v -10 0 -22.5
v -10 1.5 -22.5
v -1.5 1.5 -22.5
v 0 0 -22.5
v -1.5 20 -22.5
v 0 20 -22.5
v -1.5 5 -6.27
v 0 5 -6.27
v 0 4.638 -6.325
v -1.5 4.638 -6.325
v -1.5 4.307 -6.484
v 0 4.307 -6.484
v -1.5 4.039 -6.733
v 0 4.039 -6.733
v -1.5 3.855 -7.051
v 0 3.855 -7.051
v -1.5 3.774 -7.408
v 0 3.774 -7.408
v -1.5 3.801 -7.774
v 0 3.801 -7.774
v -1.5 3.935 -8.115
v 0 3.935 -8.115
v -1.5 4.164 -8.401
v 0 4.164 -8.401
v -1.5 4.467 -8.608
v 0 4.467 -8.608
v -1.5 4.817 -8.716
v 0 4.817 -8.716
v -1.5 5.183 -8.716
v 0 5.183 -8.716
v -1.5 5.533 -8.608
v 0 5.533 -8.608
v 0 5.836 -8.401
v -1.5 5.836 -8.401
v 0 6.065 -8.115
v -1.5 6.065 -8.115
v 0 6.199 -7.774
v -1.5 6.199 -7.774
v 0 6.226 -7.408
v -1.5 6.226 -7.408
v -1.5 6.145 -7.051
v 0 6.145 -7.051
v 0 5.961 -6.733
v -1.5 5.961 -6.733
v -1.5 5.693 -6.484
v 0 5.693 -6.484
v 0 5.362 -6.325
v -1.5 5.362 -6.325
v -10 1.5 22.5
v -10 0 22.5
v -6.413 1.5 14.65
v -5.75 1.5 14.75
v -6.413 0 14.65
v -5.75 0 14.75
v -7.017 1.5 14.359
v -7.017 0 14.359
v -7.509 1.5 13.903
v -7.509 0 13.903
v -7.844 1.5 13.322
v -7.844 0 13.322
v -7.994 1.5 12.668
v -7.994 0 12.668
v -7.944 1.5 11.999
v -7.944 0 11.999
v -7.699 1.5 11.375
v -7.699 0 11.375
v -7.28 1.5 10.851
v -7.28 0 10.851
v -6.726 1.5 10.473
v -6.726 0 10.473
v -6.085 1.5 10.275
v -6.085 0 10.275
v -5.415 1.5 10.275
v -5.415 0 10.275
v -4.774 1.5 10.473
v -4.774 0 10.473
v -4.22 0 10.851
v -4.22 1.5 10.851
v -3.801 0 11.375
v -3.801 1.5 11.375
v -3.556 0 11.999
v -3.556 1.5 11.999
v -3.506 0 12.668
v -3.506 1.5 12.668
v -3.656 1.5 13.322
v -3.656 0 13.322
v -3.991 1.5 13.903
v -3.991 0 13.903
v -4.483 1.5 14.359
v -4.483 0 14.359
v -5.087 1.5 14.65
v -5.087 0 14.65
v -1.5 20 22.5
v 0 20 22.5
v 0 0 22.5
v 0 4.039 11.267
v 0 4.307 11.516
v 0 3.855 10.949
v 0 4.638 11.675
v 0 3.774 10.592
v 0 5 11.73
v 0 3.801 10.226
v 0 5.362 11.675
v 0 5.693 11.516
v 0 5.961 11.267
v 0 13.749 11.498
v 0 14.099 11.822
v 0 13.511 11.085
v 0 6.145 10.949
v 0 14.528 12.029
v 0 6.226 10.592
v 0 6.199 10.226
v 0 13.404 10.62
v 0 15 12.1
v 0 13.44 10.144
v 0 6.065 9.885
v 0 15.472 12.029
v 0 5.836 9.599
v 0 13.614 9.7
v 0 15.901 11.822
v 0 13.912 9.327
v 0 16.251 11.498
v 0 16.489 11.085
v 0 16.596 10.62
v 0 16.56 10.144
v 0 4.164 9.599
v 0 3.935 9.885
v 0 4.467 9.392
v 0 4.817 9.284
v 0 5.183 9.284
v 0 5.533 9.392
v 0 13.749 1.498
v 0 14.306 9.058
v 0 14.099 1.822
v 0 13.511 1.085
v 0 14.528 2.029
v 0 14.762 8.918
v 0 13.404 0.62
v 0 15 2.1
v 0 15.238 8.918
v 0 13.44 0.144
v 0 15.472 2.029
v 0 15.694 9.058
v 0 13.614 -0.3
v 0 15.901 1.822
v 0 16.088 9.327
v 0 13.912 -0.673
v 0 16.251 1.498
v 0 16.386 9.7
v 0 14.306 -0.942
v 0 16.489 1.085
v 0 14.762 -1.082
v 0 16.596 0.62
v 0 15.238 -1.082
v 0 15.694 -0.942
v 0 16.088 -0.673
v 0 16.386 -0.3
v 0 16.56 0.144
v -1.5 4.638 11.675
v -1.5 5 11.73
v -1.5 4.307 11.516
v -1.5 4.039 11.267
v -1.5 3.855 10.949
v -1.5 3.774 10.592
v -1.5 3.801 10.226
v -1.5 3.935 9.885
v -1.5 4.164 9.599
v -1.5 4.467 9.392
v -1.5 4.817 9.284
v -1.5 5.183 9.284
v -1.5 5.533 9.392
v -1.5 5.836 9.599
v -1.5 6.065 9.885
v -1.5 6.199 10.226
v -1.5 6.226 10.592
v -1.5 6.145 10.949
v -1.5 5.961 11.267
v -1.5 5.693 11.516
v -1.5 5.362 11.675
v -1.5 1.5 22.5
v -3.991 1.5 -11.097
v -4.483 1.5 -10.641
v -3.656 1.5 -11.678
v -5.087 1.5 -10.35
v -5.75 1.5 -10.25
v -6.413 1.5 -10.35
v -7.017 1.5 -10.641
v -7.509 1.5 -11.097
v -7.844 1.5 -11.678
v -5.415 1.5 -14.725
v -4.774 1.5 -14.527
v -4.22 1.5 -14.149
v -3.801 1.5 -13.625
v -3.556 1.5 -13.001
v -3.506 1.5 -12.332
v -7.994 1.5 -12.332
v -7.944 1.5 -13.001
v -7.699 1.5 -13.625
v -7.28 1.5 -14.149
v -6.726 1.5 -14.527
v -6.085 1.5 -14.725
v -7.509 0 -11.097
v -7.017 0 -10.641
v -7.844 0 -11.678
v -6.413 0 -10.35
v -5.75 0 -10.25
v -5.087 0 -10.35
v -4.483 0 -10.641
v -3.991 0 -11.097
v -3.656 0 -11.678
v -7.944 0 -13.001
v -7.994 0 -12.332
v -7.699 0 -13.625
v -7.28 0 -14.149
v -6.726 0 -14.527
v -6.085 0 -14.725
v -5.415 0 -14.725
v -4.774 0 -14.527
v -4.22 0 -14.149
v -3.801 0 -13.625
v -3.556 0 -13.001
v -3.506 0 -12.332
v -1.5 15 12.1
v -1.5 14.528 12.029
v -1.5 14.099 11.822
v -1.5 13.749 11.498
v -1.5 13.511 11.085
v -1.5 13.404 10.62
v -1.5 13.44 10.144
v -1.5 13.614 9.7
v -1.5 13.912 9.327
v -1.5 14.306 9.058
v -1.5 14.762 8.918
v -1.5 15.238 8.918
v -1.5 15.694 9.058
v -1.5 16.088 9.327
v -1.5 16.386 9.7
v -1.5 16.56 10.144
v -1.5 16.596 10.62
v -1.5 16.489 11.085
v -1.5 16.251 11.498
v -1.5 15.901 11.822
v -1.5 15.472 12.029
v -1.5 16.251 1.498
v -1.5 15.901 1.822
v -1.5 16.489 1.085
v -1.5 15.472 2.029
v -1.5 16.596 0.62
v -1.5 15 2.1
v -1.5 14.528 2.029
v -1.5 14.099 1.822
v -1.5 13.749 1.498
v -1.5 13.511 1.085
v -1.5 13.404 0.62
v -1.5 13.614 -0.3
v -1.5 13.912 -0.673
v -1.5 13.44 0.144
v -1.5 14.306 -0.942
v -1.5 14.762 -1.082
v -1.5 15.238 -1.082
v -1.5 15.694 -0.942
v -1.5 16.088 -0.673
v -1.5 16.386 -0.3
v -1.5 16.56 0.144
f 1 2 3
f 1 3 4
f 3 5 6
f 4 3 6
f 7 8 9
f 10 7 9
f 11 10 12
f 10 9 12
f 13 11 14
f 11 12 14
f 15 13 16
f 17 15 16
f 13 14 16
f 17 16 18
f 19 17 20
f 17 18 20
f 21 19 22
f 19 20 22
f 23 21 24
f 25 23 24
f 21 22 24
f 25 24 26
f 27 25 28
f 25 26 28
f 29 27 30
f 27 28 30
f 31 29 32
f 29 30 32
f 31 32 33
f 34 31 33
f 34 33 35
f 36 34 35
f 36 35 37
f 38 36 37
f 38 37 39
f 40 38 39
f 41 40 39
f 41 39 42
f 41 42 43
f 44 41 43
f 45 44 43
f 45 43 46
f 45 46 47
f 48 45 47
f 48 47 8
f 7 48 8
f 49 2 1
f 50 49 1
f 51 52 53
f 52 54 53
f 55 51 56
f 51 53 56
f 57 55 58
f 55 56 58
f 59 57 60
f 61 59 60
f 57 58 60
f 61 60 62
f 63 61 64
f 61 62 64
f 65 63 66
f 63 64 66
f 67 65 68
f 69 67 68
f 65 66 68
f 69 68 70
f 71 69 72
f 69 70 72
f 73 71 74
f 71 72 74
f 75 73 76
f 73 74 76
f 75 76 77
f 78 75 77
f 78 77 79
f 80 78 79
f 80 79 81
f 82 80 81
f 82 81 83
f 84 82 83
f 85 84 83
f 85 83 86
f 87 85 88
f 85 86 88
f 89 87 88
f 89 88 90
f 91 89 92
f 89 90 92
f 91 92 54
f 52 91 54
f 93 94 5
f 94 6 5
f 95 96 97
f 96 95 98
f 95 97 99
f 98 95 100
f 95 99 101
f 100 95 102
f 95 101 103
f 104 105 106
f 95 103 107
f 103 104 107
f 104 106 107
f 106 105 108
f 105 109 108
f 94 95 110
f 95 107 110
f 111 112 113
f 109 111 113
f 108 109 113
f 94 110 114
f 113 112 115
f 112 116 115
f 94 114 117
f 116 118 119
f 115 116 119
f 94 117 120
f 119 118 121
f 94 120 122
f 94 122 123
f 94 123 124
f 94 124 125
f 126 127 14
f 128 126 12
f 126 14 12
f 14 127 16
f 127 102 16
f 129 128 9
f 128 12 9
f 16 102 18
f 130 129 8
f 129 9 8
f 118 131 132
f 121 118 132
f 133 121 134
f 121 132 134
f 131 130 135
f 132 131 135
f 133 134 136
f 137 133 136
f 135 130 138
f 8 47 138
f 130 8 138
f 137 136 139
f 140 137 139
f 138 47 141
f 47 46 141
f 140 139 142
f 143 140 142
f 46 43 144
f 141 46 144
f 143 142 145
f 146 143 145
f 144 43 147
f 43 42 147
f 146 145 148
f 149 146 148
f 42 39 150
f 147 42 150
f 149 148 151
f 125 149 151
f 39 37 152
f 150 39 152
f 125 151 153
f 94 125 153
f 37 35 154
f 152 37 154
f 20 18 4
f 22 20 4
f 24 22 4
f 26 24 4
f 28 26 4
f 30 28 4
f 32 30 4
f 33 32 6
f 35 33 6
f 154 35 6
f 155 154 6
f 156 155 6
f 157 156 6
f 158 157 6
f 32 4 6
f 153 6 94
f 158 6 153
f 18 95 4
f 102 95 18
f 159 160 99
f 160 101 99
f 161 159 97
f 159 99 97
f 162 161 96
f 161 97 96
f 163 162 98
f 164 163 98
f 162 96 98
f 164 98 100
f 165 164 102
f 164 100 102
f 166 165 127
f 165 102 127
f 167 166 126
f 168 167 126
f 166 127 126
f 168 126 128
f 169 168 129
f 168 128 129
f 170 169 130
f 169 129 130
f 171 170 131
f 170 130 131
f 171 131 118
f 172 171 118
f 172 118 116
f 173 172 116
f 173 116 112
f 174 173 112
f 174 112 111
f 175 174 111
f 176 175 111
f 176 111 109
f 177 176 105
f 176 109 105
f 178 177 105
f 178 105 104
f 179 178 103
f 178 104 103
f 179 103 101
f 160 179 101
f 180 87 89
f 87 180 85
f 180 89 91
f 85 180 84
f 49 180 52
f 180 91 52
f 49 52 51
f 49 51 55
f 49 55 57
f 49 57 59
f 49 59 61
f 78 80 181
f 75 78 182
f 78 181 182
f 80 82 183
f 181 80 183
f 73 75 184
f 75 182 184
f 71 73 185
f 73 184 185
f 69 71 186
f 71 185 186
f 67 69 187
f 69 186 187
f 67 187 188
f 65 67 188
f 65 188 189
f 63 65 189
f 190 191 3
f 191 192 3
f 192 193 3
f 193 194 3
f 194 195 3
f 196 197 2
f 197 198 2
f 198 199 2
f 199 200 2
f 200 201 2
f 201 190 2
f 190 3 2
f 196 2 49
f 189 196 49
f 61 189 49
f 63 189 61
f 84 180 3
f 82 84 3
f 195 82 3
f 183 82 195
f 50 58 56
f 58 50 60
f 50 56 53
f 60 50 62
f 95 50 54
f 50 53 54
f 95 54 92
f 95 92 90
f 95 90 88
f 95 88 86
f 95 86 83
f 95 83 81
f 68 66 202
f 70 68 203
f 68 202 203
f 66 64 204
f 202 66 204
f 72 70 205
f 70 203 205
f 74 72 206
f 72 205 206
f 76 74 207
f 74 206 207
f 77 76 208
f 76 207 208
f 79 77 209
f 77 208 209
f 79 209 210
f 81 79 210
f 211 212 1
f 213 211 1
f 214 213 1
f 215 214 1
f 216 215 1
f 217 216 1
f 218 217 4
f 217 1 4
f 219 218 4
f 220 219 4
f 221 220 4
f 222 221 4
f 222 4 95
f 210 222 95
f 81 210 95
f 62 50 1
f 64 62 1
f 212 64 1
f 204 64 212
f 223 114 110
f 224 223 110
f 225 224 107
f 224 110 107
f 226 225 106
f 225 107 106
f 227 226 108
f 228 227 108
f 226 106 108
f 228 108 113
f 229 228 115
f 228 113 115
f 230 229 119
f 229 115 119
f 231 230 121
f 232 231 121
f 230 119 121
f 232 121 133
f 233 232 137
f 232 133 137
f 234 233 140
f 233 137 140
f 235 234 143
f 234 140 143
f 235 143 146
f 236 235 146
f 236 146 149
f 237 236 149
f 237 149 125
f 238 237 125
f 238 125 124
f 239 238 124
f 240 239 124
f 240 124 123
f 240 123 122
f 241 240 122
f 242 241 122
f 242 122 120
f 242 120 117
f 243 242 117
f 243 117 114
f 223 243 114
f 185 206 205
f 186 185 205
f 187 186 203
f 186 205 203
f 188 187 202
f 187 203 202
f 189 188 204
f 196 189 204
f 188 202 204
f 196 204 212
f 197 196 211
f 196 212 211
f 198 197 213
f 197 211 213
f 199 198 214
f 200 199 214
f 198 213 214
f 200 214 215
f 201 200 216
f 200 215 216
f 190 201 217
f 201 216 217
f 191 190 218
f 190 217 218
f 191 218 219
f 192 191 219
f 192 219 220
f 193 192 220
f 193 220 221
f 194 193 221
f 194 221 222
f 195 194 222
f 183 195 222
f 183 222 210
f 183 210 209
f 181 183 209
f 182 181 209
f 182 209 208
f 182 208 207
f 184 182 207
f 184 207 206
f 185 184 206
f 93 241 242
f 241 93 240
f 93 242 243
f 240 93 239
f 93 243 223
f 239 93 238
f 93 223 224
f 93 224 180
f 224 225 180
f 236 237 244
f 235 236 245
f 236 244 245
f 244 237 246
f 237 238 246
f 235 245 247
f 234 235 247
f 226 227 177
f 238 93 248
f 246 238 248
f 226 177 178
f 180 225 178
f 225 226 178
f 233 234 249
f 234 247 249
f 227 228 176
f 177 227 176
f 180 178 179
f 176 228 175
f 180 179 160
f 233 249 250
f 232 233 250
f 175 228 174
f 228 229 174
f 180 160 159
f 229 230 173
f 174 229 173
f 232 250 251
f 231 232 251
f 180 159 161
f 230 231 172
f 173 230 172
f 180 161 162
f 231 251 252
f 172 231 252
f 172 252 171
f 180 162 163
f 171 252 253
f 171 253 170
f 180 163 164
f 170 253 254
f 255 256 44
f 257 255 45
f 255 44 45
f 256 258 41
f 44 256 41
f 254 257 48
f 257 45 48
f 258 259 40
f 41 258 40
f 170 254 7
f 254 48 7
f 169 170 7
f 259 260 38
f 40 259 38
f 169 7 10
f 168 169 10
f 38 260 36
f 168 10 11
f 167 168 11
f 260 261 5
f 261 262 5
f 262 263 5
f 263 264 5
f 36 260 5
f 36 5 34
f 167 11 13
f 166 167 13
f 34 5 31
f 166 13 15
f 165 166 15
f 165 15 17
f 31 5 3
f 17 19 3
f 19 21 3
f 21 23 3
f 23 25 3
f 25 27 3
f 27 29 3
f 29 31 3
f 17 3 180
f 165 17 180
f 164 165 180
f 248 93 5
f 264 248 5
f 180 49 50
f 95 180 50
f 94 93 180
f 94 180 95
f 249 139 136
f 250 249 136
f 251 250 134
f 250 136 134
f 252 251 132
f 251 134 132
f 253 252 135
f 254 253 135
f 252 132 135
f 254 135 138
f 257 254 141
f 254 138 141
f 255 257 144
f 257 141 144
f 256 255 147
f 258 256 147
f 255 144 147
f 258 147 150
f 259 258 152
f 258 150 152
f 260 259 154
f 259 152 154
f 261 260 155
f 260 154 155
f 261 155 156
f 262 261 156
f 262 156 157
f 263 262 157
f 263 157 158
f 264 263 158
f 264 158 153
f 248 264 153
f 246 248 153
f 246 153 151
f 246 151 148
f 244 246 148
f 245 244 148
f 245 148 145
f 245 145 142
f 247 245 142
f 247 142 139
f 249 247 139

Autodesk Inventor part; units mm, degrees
ref_plane "YZ Plane" through (0, 0, 0) normal (1, 0, 0) x (0, 1, 0)
ref_plane "XZ Plane" through (0, 0, 0) normal (0, 1, 0) x (-1, 0, 0)
ref_plane "XY Plane" through (0, 0, 0) normal (0, 0, 1) x (1, 0, 0)
sketch "Náčrt1" plane through (0, 0, 0) normal (0, 0, 1) x (1, 0, 0)
  line L0 (-10, 0) -> (0, 0)
  line L1 (0, 0) -> (0, 20)
  line L2 (0, 20) -> (-1.5, 20)
  line L3 (-1.5, 20) -> (-1.5, 1.5)
  line L4 (-1.5, 1.5) -> (-10, 1.5)
  line L5 (-10, 1.5) -> (-10, 0)
  line L6 (-12, 0) -> (2, 0) projected
  line L7 (0, 24) -> (0, -4) projected
  point P0 (0, 0)
  dimension "d0" = 20
  dimension "d1" = 10
  dimension "d2" = 1.5
  dimension "d3" = 1.5
extrude "Vysunutí1" add sketch "Náčrt1" along normal mid plane 45
sketch "Náčrt2" plane through (-10, 1.5, 22.5) normal (0, 1, 0) x (1, 0, 0)
  line L0 (0, 0) -> (0, 45) projected
  line L1 (8.5, 0) -> (0, 0) projected
  line L2 (8.5, 45) -> (8.5, 0) projected
  line L3 (0, 45) -> (8.5, 45) projected
  point P0 (10, 22.5)
  point P1 (4.25, 35)
  point P2 (4.25, 10)
  point P3 (4.25, 0)
  dimension "d6" = 4.25
  dimension "d7" = 4.25
  dimension "d8" = 25
  dimension "d9" = 10
hole "Díra1" at (-5.75, 1.5, -12.5) at (-5.75, 1.5, 12.5) direction (0, -1, 0) diameter 4.5 end through all
sketch "Náčrt3" plane through (-1.5, 1.5, 22.5) normal (-1, 0, 0) x (0, 0, 1)
  line L0 (-45, 0) -> (0, 0) projected
  line L1 (0, 18.5) -> (0, 0) projected
  line L2 (-45, 18.5) -> (0, 18.5) projected
  line L3 (-45, 0) -> (-45, 18.5) projected
  point P0 (-22.5, -1.5)
  point P1 (-12, 13.5)
  point P2 (-22, 13.5)
  dimension "d17" = 10
  dimension "d18" = 5
  dimension "d19" = 5
  dimension "d20" = 12
hole "Díra2" at (-1.5, 15, 10.5) at (-1.5, 15, 0.5) direction (1, 0, 0) diameter 3.2 end through all
sketch "Náčrt4" plane through (-1.5, 1.5, 22.5) normal (-1, 0, 0) x (0, 0, 1)
  circle A0 centre (-22, 13.5) radius 1.6 projected
  circle A1 centre (-12, 13.5) radius 1.6 projected
  line L0 (-45, 0) -> (0, 0) projected
  line L1 (0, 18.5) -> (0, 0) projected
  line L2 (-45, 18.5) -> (0, 18.5) projected
  line L3 (-45, 0) -> (-45, 18.5) projected
  line L4 (-45, -1.5) -> (0, -1.5) projected
  point P0 (-22.5, -1.5)
  point P1 (-30, 3.5)
  point P2 (-12, 3.5)
  dimension "d28" = 5
  dimension "d29" = 5
  dimension "d30" = 18
  dimension "d31" = 12
hole "Díra3" at (-1.5, 5, -7.5) at (-1.5, 5, 10.5) direction (1, 0, 0) diameter 2.459 end through all thread size "M3x0.5" class "6H" standard "ISO Metric profile"
properties part number "x_bracket" material "Hliník 6061"
